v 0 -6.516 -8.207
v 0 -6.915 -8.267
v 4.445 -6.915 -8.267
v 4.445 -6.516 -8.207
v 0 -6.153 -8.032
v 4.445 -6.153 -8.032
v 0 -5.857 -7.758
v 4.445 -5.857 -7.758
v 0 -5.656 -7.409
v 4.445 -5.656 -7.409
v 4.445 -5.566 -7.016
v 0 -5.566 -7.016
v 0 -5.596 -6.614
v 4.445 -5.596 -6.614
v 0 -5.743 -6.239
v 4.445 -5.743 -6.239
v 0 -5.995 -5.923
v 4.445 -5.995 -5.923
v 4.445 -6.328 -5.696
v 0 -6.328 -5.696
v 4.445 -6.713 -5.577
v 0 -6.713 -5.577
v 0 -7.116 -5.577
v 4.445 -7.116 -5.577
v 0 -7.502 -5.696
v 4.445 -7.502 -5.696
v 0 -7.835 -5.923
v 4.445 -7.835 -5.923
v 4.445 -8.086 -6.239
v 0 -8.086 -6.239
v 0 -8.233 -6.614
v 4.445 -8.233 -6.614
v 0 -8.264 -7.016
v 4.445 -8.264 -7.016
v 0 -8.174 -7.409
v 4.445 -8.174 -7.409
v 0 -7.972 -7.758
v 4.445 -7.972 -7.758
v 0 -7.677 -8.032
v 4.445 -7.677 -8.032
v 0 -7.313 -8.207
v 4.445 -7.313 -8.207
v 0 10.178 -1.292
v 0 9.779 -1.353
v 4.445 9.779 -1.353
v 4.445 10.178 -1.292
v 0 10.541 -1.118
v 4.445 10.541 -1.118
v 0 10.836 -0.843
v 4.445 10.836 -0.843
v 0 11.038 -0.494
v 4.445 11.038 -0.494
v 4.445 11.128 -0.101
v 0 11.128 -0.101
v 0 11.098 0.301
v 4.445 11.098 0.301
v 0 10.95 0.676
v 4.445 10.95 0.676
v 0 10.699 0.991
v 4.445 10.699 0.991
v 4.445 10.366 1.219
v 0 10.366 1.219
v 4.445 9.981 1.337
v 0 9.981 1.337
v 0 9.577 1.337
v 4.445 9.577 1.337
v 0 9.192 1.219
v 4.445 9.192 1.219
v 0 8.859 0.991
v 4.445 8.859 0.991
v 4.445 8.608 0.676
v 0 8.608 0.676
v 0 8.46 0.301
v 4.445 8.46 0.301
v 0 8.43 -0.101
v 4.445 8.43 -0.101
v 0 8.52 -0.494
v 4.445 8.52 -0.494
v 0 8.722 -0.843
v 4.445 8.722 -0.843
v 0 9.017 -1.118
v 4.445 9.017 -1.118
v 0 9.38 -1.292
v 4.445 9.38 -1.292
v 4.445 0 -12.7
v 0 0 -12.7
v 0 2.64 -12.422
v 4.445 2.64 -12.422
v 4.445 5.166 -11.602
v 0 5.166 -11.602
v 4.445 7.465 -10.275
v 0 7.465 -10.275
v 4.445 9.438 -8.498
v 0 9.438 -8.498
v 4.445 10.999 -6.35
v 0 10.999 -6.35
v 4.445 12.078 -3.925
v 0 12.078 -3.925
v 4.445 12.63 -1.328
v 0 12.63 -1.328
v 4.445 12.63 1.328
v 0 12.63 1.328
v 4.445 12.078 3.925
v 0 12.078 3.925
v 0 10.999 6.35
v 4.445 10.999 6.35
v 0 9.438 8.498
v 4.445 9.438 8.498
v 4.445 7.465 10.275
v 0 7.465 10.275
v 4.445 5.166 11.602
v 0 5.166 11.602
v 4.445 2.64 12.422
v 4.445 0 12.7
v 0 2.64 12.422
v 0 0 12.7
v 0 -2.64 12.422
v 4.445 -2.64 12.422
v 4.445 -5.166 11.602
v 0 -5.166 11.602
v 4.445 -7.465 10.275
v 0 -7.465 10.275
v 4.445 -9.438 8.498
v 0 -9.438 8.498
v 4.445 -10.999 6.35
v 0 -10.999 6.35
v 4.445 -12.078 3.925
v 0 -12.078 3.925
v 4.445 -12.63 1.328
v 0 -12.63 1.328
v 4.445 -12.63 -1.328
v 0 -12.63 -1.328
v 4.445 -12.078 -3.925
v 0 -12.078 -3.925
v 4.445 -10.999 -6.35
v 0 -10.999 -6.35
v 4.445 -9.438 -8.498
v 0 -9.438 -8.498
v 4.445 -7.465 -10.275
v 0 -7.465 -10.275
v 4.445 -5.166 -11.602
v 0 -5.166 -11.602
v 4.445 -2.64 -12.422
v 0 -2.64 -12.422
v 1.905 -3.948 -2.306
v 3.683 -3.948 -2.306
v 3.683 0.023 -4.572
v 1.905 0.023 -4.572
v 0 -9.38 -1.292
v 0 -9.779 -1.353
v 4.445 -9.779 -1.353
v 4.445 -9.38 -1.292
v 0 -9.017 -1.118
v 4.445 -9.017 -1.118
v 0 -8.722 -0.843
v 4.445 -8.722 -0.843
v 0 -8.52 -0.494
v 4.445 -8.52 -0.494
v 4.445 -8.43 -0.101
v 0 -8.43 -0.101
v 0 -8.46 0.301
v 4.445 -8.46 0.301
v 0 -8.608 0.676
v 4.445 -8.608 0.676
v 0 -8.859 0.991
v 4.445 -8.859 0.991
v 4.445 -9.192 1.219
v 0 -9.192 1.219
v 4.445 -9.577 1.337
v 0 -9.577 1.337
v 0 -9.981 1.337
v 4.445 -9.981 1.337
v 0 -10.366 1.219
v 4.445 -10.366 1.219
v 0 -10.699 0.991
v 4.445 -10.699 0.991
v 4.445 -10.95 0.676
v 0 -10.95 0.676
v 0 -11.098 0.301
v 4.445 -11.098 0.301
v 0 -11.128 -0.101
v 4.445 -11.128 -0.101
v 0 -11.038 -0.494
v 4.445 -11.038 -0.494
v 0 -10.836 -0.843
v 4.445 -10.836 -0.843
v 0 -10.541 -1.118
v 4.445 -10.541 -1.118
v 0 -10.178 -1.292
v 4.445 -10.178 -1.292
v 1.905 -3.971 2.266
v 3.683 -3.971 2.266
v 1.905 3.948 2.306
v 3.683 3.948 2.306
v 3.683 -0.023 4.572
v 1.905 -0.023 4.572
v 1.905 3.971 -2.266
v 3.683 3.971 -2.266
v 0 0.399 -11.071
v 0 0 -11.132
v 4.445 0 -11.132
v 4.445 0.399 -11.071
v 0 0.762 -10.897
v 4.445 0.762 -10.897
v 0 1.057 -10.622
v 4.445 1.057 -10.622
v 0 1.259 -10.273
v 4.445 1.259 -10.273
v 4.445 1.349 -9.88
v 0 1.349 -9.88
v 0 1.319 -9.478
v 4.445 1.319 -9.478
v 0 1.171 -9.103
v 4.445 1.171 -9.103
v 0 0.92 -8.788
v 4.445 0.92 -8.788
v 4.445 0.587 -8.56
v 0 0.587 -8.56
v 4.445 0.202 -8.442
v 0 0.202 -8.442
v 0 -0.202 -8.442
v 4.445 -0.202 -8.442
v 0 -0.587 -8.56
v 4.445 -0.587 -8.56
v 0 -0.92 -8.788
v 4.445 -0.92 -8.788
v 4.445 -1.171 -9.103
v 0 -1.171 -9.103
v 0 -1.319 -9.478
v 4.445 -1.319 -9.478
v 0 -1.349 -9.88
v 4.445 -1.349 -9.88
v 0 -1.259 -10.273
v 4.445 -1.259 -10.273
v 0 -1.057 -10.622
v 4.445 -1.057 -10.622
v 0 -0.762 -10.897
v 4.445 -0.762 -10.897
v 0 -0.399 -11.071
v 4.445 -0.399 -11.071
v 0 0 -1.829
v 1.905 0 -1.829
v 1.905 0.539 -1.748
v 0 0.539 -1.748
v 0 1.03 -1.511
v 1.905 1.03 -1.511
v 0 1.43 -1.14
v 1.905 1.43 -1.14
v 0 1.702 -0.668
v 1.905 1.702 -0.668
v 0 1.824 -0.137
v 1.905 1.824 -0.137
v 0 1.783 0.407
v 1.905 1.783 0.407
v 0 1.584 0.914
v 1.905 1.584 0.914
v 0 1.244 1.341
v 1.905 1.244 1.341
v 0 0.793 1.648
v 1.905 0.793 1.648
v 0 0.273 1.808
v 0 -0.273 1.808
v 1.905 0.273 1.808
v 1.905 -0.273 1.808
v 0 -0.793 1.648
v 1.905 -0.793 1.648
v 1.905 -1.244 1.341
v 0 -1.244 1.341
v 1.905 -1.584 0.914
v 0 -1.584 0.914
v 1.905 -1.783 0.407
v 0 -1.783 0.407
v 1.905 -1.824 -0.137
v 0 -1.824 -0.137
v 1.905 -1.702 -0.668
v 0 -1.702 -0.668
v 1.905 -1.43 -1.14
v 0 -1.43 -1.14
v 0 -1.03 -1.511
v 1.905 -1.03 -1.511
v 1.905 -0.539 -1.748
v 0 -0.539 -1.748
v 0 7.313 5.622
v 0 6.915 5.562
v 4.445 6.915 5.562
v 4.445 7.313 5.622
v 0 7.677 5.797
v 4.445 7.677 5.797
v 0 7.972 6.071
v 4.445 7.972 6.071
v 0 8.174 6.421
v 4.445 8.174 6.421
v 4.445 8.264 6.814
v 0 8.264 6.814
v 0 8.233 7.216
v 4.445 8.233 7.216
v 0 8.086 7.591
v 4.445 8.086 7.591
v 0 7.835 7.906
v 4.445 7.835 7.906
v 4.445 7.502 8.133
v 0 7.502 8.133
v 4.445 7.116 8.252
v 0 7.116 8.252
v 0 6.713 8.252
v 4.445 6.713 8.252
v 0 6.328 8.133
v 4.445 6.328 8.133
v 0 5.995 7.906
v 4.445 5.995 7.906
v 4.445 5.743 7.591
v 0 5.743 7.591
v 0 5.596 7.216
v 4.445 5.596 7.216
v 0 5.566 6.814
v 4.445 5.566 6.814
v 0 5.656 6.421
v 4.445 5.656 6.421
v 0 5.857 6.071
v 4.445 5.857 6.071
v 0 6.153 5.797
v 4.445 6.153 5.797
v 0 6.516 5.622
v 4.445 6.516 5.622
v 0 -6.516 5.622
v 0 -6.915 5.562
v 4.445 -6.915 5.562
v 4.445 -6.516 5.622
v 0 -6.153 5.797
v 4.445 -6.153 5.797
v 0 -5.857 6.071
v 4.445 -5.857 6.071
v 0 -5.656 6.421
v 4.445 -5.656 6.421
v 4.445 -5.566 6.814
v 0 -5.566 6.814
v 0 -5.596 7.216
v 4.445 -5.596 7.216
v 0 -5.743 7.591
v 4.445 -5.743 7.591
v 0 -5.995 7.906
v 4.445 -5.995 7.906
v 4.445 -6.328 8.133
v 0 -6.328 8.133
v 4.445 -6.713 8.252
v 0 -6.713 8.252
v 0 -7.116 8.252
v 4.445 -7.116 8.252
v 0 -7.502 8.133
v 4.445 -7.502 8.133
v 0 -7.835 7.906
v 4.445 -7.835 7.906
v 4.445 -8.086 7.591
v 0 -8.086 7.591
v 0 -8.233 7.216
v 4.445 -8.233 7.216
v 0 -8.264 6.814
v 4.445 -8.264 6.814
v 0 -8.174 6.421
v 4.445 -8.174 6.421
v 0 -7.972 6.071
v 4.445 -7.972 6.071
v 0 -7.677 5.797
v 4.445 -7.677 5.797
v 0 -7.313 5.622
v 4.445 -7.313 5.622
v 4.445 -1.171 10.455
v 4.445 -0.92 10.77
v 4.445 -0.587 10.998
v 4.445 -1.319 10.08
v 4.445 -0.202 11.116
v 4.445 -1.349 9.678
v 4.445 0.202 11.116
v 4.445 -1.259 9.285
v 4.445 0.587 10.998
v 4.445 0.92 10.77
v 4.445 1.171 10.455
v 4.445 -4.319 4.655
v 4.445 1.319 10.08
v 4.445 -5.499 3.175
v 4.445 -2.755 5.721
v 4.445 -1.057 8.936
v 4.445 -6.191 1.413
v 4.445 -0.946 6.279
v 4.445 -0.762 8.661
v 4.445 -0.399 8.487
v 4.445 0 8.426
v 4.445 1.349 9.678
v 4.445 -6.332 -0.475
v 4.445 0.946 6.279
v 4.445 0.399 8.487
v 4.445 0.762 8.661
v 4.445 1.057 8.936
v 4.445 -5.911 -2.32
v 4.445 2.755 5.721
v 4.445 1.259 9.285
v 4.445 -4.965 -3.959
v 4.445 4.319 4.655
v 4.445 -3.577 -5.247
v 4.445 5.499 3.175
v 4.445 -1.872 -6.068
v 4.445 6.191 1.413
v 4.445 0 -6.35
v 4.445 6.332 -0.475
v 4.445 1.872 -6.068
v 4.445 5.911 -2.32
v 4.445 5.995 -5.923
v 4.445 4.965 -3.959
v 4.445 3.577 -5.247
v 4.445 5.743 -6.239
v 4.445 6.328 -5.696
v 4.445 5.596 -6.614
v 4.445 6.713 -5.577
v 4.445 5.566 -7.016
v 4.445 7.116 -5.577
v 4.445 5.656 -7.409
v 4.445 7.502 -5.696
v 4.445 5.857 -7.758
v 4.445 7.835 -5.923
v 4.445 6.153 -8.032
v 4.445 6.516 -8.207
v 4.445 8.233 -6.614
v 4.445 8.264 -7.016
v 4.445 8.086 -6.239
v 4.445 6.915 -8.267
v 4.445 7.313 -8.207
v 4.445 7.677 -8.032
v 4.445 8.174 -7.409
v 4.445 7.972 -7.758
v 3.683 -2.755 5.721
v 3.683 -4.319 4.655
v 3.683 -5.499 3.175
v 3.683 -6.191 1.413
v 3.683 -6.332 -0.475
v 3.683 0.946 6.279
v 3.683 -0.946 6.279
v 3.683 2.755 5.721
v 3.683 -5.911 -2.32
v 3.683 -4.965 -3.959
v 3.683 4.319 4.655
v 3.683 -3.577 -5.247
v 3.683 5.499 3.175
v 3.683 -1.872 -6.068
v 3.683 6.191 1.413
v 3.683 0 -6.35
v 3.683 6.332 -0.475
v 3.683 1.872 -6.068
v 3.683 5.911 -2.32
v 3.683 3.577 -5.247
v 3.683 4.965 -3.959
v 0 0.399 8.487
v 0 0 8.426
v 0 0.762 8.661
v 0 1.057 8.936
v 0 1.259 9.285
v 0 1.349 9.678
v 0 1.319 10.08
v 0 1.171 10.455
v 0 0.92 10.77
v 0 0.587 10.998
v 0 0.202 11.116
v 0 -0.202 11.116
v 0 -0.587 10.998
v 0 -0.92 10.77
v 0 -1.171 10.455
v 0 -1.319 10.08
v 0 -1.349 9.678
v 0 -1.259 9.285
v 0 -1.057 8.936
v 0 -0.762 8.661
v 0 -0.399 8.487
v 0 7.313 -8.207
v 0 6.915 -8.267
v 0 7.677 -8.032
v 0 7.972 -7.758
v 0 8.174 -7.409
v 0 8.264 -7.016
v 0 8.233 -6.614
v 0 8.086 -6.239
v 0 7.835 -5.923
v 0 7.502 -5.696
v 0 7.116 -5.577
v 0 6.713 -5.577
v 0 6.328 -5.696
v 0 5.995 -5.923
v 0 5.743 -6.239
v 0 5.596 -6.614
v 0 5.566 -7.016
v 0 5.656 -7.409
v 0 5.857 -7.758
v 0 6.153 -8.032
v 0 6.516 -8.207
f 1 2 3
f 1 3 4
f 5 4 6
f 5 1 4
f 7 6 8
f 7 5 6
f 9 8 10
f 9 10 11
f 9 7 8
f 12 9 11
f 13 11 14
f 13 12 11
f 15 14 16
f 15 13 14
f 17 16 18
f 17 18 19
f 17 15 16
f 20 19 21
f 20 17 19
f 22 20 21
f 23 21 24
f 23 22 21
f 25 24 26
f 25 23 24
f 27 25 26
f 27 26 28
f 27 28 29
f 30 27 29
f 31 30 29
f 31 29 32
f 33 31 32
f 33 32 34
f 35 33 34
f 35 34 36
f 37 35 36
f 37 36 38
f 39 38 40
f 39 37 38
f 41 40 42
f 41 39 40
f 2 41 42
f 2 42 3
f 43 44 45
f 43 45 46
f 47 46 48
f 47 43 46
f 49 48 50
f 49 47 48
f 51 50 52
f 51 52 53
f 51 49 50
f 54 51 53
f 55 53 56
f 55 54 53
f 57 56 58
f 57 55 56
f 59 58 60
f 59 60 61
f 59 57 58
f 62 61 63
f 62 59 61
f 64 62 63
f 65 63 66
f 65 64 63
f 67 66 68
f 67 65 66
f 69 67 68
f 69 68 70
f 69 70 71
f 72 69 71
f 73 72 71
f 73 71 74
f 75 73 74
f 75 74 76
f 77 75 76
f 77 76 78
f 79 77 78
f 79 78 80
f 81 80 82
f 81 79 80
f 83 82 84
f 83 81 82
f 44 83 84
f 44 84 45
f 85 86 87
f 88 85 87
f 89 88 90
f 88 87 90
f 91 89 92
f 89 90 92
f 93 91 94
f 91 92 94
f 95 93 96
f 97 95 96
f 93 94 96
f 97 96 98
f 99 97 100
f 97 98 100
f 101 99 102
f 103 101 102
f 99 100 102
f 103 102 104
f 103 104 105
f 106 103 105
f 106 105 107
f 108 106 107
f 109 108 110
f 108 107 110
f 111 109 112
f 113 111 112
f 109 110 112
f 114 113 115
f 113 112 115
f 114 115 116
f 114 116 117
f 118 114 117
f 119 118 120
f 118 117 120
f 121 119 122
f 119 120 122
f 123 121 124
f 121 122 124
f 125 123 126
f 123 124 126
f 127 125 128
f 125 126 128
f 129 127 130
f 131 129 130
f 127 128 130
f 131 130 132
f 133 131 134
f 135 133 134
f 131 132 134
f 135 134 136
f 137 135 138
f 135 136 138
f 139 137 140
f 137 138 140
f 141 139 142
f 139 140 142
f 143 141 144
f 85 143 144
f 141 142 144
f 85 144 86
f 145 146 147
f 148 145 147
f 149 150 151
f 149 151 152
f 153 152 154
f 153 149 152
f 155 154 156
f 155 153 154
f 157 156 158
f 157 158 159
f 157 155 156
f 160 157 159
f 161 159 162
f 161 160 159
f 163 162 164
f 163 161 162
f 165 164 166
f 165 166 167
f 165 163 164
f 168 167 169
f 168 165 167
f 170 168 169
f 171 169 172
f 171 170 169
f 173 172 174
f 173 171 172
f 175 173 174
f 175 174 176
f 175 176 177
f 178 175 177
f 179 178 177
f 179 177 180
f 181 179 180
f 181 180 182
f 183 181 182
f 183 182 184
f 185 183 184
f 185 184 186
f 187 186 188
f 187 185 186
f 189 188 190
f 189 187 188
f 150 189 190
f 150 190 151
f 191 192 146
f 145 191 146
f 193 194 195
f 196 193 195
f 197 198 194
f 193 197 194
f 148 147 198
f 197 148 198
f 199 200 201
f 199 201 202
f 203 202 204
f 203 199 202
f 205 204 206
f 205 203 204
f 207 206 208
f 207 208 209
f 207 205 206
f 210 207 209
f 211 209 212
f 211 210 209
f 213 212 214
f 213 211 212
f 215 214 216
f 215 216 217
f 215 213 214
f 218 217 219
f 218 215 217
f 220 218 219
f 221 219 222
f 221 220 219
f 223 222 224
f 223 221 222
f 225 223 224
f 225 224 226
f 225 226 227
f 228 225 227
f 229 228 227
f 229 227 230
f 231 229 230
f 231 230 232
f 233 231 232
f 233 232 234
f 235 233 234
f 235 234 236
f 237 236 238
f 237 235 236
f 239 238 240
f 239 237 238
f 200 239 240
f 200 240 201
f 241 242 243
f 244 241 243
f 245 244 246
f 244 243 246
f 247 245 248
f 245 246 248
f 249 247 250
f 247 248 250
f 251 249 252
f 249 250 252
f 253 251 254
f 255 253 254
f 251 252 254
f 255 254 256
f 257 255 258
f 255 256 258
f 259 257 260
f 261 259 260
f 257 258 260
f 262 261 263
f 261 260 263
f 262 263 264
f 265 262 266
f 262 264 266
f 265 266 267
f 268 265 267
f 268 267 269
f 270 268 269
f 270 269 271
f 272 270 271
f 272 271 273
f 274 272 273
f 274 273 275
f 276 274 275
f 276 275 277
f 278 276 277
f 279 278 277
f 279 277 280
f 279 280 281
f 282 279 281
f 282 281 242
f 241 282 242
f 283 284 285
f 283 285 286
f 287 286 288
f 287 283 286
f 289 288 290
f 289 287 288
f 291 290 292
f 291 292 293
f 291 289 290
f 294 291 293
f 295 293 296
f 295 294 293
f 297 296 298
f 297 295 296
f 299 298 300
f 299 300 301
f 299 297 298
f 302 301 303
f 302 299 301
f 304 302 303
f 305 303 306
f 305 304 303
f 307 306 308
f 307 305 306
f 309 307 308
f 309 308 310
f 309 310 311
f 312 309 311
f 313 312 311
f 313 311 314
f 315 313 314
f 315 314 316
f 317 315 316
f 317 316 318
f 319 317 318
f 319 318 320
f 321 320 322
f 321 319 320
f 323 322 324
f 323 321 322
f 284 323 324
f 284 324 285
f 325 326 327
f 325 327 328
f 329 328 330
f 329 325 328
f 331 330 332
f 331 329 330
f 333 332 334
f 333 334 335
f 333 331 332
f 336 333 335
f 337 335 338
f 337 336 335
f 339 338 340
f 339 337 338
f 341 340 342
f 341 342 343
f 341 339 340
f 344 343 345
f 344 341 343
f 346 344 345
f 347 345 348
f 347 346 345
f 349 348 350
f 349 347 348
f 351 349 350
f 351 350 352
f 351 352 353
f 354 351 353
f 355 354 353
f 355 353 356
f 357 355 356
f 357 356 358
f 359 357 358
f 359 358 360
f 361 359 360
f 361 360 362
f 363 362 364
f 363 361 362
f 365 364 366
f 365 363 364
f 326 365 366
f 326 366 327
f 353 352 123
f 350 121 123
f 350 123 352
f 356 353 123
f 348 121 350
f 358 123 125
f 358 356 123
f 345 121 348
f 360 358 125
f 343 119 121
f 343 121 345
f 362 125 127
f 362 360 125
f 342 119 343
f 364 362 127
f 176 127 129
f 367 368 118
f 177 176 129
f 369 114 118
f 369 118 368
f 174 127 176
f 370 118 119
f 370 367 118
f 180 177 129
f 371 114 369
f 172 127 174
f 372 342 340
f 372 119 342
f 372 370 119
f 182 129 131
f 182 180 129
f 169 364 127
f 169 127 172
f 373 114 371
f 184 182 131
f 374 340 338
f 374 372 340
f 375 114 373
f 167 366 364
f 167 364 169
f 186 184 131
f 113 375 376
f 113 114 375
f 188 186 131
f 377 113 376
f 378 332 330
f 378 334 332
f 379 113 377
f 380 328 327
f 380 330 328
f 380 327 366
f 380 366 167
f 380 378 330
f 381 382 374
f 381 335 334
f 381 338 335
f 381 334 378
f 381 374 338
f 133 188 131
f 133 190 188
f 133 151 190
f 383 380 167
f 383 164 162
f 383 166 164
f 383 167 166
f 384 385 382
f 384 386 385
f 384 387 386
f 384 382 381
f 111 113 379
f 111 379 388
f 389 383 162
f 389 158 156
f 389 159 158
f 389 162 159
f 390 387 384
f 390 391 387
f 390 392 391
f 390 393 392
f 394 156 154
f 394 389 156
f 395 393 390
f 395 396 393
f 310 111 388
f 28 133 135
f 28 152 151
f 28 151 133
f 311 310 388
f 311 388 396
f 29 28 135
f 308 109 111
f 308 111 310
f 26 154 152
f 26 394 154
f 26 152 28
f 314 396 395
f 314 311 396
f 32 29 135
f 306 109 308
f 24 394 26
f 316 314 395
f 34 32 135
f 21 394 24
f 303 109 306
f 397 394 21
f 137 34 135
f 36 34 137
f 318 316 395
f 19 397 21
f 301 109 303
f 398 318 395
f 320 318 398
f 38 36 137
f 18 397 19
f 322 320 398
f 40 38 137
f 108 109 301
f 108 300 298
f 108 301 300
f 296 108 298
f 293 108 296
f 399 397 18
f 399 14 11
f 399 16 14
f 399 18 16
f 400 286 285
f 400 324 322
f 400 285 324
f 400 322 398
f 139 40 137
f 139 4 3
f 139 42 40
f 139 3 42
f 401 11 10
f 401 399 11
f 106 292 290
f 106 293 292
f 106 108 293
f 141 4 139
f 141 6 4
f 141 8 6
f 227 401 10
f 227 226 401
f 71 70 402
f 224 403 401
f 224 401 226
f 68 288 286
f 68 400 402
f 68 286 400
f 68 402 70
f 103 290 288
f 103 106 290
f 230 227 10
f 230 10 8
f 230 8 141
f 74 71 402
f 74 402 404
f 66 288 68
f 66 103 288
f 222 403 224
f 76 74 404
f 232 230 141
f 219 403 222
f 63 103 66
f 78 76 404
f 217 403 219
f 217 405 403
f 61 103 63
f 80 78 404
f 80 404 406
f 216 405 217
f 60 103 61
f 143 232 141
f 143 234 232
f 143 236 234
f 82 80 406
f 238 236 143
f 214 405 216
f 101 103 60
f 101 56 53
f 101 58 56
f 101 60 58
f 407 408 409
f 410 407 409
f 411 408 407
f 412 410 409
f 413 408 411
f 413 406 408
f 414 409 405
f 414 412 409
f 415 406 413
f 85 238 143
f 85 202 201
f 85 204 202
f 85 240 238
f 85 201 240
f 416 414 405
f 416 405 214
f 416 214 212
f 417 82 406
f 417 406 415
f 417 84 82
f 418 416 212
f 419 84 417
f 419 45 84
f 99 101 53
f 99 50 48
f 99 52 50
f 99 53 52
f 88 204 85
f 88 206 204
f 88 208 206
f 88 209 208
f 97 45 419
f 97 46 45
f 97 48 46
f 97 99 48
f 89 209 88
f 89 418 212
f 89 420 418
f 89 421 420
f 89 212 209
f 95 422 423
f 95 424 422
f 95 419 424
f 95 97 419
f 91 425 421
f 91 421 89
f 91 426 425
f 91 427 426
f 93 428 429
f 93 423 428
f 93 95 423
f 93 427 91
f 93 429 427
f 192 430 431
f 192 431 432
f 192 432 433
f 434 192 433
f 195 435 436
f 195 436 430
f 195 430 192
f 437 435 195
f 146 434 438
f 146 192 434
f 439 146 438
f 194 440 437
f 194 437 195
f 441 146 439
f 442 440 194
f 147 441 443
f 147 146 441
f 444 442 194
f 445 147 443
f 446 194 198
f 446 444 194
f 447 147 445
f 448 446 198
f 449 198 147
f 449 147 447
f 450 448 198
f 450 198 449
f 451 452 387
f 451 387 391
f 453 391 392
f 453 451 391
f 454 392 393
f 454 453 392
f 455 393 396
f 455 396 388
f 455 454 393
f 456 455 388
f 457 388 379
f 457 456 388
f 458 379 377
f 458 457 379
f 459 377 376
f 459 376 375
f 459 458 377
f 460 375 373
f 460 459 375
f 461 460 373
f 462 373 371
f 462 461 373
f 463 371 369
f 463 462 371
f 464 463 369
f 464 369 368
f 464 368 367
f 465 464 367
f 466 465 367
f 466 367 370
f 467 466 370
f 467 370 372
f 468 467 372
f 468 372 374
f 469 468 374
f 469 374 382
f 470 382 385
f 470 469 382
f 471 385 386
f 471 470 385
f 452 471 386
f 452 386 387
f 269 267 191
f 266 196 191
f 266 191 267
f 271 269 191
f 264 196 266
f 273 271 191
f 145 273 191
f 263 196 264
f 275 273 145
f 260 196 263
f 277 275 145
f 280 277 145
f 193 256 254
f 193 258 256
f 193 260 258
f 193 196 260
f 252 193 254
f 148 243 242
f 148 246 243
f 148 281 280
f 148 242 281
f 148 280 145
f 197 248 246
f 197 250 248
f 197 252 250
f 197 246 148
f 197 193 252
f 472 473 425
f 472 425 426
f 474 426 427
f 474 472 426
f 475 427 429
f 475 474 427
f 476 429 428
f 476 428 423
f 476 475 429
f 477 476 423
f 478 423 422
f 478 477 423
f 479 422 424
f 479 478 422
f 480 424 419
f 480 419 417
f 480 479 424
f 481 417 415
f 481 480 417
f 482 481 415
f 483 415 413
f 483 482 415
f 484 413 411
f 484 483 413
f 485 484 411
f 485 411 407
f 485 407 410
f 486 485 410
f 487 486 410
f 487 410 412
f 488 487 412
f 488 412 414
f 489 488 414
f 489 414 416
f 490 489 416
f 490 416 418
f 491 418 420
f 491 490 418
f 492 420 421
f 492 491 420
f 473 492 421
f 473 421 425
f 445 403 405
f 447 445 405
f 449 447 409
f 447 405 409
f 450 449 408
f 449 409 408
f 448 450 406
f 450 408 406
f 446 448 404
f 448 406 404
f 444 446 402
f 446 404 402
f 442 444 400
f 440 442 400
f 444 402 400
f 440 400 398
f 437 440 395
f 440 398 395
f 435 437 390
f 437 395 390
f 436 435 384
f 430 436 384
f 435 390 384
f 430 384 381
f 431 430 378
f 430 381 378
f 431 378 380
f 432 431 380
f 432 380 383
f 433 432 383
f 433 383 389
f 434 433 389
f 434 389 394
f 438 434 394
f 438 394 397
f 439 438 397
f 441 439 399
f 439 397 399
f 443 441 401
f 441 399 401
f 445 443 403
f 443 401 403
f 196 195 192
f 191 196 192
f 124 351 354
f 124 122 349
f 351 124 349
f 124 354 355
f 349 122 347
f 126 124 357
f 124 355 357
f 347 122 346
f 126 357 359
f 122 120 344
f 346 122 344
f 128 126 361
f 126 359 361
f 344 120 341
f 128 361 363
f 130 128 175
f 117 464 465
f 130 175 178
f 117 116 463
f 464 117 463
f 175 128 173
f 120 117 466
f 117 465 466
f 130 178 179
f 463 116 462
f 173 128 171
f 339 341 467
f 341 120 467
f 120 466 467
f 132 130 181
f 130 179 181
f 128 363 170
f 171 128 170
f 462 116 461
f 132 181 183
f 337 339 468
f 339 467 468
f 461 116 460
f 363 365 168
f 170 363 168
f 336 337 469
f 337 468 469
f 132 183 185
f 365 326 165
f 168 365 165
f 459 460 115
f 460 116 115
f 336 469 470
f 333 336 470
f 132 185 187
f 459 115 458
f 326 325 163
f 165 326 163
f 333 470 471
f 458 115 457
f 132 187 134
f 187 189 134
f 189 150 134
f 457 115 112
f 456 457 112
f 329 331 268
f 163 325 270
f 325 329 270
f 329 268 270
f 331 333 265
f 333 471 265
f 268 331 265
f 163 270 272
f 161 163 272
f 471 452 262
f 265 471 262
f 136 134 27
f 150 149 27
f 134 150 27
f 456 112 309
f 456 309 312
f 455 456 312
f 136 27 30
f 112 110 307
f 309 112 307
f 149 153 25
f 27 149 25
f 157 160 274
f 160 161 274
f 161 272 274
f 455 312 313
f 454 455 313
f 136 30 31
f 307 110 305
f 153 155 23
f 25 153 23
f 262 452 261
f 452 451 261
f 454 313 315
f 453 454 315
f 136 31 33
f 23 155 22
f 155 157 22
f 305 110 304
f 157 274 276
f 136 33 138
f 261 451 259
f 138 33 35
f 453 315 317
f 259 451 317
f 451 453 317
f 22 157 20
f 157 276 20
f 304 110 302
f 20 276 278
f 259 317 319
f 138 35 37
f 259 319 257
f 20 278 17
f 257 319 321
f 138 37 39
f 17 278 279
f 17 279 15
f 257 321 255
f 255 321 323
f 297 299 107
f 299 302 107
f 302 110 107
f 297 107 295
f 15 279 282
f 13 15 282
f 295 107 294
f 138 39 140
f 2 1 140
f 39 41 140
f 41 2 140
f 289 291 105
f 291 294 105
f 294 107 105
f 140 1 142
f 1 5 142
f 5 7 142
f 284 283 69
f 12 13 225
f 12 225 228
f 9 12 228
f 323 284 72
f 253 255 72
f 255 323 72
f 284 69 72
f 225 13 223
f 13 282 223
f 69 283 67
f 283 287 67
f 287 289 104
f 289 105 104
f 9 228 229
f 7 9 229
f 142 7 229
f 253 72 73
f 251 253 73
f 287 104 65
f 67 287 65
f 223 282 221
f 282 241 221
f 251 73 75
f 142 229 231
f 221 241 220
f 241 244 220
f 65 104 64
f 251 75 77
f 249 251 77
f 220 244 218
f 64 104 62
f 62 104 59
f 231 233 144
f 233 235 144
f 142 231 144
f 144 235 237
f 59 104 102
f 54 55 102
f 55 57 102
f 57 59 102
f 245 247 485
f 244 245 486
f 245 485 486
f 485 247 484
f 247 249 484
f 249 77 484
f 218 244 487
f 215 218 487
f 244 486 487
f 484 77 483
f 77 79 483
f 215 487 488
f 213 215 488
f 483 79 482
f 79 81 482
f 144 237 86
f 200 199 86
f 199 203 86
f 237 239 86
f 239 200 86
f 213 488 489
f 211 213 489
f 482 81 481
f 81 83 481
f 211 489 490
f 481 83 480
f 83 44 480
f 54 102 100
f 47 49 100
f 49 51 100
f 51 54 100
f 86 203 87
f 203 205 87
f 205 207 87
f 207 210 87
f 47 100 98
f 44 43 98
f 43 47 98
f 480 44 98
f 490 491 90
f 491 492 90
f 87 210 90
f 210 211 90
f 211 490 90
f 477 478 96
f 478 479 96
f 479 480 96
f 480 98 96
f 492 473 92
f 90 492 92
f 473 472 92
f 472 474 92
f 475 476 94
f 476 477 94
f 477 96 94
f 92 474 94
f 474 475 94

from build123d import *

# Parameters (mm, degrees)
SKETCH1_R           = 12.7
SKETCH1_R_2         = 1.35255
BOSS_EXTRUDE1_DEPTH = 4.445
SKETCH2_R           = 6.35
CUT_EXTRUDE1_DEPTH  = 0.762
CUT_EXTRUDE4_DEPTH  = 1.778
SKETCH6_R           = 1.8288
CUT_EXTRUDE5_DEPTH  = 2.905


with BuildPart() as part:
    # Sketch1 → Boss-Extrude1 (new body)
    with BuildSketch(Plane(origin=(0, 0, 0), x_dir=(0, 0, -1), z_dir=(1, 0, 0))):
        Circle(SKETCH1_R)
        with Locations((0, 9.779)):
            Circle(SKETCH1_R_2, mode=Mode.SUBTRACT)
        with Locations((6.914797213, 6.914797213)):
            Circle(SKETCH1_R_2, mode=Mode.SUBTRACT)
        with Locations((9.779, 0)):
            Circle(SKETCH1_R_2, mode=Mode.SUBTRACT)
        with Locations((6.914797213, -6.914797213)):
            Circle(SKETCH1_R_2, mode=Mode.SUBTRACT)
        with Locations((0, -9.779)):
            Circle(SKETCH1_R_2, mode=Mode.SUBTRACT)
        with Locations((-6.914797213, -6.914797213)):
            Circle(SKETCH1_R_2, mode=Mode.SUBTRACT)
        with Locations((-9.779, 0)):
            Circle(SKETCH1_R_2, mode=Mode.SUBTRACT)
        with Locations((-6.914797213, 6.914797213)):
            Circle(SKETCH1_R_2, mode=Mode.SUBTRACT)
    extrude(amount=BOSS_EXTRUDE1_DEPTH)

    # Sketch2 → Cut-Extrude1 (cut)
    with BuildSketch(Plane(origin=(4.445, 0, 0), x_dir=(0, 0, -1), z_dir=(1, 0, 0))):
        Circle(SKETCH2_R)
    extrude(amount=-CUT_EXTRUDE1_DEPTH, mode=Mode.SUBTRACT)

    # Sketch5 → Cut-Extrude4 (cut)
    with BuildSketch(Plane(origin=(3.683, 0, 0), x_dir=(0, 0, -1), z_dir=(1, 0, 0))):
        Polygon((-2.305627782, 3.948070989), (-4.571943663, -0.022696736), (-2.266315881, -3.970767725), (2.305627782, -3.948070989), (4.571943663, 0.022696736), (2.266315881, 3.970767725), align=None)
    extrude(amount=-CUT_EXTRUDE4_DEPTH, mode=Mode.SUBTRACT)

    # Sketch6 → Cut-Extrude5 (cut, through all)
    with BuildSketch(Plane(origin=(1.905, 0, 0), x_dir=(0, 0, -1), z_dir=(1, 0, 0))):
        Circle(SKETCH6_R)
    extrude(amount=-CUT_EXTRUDE5_DEPTH, mode=Mode.SUBTRACT)


solid = part.part
